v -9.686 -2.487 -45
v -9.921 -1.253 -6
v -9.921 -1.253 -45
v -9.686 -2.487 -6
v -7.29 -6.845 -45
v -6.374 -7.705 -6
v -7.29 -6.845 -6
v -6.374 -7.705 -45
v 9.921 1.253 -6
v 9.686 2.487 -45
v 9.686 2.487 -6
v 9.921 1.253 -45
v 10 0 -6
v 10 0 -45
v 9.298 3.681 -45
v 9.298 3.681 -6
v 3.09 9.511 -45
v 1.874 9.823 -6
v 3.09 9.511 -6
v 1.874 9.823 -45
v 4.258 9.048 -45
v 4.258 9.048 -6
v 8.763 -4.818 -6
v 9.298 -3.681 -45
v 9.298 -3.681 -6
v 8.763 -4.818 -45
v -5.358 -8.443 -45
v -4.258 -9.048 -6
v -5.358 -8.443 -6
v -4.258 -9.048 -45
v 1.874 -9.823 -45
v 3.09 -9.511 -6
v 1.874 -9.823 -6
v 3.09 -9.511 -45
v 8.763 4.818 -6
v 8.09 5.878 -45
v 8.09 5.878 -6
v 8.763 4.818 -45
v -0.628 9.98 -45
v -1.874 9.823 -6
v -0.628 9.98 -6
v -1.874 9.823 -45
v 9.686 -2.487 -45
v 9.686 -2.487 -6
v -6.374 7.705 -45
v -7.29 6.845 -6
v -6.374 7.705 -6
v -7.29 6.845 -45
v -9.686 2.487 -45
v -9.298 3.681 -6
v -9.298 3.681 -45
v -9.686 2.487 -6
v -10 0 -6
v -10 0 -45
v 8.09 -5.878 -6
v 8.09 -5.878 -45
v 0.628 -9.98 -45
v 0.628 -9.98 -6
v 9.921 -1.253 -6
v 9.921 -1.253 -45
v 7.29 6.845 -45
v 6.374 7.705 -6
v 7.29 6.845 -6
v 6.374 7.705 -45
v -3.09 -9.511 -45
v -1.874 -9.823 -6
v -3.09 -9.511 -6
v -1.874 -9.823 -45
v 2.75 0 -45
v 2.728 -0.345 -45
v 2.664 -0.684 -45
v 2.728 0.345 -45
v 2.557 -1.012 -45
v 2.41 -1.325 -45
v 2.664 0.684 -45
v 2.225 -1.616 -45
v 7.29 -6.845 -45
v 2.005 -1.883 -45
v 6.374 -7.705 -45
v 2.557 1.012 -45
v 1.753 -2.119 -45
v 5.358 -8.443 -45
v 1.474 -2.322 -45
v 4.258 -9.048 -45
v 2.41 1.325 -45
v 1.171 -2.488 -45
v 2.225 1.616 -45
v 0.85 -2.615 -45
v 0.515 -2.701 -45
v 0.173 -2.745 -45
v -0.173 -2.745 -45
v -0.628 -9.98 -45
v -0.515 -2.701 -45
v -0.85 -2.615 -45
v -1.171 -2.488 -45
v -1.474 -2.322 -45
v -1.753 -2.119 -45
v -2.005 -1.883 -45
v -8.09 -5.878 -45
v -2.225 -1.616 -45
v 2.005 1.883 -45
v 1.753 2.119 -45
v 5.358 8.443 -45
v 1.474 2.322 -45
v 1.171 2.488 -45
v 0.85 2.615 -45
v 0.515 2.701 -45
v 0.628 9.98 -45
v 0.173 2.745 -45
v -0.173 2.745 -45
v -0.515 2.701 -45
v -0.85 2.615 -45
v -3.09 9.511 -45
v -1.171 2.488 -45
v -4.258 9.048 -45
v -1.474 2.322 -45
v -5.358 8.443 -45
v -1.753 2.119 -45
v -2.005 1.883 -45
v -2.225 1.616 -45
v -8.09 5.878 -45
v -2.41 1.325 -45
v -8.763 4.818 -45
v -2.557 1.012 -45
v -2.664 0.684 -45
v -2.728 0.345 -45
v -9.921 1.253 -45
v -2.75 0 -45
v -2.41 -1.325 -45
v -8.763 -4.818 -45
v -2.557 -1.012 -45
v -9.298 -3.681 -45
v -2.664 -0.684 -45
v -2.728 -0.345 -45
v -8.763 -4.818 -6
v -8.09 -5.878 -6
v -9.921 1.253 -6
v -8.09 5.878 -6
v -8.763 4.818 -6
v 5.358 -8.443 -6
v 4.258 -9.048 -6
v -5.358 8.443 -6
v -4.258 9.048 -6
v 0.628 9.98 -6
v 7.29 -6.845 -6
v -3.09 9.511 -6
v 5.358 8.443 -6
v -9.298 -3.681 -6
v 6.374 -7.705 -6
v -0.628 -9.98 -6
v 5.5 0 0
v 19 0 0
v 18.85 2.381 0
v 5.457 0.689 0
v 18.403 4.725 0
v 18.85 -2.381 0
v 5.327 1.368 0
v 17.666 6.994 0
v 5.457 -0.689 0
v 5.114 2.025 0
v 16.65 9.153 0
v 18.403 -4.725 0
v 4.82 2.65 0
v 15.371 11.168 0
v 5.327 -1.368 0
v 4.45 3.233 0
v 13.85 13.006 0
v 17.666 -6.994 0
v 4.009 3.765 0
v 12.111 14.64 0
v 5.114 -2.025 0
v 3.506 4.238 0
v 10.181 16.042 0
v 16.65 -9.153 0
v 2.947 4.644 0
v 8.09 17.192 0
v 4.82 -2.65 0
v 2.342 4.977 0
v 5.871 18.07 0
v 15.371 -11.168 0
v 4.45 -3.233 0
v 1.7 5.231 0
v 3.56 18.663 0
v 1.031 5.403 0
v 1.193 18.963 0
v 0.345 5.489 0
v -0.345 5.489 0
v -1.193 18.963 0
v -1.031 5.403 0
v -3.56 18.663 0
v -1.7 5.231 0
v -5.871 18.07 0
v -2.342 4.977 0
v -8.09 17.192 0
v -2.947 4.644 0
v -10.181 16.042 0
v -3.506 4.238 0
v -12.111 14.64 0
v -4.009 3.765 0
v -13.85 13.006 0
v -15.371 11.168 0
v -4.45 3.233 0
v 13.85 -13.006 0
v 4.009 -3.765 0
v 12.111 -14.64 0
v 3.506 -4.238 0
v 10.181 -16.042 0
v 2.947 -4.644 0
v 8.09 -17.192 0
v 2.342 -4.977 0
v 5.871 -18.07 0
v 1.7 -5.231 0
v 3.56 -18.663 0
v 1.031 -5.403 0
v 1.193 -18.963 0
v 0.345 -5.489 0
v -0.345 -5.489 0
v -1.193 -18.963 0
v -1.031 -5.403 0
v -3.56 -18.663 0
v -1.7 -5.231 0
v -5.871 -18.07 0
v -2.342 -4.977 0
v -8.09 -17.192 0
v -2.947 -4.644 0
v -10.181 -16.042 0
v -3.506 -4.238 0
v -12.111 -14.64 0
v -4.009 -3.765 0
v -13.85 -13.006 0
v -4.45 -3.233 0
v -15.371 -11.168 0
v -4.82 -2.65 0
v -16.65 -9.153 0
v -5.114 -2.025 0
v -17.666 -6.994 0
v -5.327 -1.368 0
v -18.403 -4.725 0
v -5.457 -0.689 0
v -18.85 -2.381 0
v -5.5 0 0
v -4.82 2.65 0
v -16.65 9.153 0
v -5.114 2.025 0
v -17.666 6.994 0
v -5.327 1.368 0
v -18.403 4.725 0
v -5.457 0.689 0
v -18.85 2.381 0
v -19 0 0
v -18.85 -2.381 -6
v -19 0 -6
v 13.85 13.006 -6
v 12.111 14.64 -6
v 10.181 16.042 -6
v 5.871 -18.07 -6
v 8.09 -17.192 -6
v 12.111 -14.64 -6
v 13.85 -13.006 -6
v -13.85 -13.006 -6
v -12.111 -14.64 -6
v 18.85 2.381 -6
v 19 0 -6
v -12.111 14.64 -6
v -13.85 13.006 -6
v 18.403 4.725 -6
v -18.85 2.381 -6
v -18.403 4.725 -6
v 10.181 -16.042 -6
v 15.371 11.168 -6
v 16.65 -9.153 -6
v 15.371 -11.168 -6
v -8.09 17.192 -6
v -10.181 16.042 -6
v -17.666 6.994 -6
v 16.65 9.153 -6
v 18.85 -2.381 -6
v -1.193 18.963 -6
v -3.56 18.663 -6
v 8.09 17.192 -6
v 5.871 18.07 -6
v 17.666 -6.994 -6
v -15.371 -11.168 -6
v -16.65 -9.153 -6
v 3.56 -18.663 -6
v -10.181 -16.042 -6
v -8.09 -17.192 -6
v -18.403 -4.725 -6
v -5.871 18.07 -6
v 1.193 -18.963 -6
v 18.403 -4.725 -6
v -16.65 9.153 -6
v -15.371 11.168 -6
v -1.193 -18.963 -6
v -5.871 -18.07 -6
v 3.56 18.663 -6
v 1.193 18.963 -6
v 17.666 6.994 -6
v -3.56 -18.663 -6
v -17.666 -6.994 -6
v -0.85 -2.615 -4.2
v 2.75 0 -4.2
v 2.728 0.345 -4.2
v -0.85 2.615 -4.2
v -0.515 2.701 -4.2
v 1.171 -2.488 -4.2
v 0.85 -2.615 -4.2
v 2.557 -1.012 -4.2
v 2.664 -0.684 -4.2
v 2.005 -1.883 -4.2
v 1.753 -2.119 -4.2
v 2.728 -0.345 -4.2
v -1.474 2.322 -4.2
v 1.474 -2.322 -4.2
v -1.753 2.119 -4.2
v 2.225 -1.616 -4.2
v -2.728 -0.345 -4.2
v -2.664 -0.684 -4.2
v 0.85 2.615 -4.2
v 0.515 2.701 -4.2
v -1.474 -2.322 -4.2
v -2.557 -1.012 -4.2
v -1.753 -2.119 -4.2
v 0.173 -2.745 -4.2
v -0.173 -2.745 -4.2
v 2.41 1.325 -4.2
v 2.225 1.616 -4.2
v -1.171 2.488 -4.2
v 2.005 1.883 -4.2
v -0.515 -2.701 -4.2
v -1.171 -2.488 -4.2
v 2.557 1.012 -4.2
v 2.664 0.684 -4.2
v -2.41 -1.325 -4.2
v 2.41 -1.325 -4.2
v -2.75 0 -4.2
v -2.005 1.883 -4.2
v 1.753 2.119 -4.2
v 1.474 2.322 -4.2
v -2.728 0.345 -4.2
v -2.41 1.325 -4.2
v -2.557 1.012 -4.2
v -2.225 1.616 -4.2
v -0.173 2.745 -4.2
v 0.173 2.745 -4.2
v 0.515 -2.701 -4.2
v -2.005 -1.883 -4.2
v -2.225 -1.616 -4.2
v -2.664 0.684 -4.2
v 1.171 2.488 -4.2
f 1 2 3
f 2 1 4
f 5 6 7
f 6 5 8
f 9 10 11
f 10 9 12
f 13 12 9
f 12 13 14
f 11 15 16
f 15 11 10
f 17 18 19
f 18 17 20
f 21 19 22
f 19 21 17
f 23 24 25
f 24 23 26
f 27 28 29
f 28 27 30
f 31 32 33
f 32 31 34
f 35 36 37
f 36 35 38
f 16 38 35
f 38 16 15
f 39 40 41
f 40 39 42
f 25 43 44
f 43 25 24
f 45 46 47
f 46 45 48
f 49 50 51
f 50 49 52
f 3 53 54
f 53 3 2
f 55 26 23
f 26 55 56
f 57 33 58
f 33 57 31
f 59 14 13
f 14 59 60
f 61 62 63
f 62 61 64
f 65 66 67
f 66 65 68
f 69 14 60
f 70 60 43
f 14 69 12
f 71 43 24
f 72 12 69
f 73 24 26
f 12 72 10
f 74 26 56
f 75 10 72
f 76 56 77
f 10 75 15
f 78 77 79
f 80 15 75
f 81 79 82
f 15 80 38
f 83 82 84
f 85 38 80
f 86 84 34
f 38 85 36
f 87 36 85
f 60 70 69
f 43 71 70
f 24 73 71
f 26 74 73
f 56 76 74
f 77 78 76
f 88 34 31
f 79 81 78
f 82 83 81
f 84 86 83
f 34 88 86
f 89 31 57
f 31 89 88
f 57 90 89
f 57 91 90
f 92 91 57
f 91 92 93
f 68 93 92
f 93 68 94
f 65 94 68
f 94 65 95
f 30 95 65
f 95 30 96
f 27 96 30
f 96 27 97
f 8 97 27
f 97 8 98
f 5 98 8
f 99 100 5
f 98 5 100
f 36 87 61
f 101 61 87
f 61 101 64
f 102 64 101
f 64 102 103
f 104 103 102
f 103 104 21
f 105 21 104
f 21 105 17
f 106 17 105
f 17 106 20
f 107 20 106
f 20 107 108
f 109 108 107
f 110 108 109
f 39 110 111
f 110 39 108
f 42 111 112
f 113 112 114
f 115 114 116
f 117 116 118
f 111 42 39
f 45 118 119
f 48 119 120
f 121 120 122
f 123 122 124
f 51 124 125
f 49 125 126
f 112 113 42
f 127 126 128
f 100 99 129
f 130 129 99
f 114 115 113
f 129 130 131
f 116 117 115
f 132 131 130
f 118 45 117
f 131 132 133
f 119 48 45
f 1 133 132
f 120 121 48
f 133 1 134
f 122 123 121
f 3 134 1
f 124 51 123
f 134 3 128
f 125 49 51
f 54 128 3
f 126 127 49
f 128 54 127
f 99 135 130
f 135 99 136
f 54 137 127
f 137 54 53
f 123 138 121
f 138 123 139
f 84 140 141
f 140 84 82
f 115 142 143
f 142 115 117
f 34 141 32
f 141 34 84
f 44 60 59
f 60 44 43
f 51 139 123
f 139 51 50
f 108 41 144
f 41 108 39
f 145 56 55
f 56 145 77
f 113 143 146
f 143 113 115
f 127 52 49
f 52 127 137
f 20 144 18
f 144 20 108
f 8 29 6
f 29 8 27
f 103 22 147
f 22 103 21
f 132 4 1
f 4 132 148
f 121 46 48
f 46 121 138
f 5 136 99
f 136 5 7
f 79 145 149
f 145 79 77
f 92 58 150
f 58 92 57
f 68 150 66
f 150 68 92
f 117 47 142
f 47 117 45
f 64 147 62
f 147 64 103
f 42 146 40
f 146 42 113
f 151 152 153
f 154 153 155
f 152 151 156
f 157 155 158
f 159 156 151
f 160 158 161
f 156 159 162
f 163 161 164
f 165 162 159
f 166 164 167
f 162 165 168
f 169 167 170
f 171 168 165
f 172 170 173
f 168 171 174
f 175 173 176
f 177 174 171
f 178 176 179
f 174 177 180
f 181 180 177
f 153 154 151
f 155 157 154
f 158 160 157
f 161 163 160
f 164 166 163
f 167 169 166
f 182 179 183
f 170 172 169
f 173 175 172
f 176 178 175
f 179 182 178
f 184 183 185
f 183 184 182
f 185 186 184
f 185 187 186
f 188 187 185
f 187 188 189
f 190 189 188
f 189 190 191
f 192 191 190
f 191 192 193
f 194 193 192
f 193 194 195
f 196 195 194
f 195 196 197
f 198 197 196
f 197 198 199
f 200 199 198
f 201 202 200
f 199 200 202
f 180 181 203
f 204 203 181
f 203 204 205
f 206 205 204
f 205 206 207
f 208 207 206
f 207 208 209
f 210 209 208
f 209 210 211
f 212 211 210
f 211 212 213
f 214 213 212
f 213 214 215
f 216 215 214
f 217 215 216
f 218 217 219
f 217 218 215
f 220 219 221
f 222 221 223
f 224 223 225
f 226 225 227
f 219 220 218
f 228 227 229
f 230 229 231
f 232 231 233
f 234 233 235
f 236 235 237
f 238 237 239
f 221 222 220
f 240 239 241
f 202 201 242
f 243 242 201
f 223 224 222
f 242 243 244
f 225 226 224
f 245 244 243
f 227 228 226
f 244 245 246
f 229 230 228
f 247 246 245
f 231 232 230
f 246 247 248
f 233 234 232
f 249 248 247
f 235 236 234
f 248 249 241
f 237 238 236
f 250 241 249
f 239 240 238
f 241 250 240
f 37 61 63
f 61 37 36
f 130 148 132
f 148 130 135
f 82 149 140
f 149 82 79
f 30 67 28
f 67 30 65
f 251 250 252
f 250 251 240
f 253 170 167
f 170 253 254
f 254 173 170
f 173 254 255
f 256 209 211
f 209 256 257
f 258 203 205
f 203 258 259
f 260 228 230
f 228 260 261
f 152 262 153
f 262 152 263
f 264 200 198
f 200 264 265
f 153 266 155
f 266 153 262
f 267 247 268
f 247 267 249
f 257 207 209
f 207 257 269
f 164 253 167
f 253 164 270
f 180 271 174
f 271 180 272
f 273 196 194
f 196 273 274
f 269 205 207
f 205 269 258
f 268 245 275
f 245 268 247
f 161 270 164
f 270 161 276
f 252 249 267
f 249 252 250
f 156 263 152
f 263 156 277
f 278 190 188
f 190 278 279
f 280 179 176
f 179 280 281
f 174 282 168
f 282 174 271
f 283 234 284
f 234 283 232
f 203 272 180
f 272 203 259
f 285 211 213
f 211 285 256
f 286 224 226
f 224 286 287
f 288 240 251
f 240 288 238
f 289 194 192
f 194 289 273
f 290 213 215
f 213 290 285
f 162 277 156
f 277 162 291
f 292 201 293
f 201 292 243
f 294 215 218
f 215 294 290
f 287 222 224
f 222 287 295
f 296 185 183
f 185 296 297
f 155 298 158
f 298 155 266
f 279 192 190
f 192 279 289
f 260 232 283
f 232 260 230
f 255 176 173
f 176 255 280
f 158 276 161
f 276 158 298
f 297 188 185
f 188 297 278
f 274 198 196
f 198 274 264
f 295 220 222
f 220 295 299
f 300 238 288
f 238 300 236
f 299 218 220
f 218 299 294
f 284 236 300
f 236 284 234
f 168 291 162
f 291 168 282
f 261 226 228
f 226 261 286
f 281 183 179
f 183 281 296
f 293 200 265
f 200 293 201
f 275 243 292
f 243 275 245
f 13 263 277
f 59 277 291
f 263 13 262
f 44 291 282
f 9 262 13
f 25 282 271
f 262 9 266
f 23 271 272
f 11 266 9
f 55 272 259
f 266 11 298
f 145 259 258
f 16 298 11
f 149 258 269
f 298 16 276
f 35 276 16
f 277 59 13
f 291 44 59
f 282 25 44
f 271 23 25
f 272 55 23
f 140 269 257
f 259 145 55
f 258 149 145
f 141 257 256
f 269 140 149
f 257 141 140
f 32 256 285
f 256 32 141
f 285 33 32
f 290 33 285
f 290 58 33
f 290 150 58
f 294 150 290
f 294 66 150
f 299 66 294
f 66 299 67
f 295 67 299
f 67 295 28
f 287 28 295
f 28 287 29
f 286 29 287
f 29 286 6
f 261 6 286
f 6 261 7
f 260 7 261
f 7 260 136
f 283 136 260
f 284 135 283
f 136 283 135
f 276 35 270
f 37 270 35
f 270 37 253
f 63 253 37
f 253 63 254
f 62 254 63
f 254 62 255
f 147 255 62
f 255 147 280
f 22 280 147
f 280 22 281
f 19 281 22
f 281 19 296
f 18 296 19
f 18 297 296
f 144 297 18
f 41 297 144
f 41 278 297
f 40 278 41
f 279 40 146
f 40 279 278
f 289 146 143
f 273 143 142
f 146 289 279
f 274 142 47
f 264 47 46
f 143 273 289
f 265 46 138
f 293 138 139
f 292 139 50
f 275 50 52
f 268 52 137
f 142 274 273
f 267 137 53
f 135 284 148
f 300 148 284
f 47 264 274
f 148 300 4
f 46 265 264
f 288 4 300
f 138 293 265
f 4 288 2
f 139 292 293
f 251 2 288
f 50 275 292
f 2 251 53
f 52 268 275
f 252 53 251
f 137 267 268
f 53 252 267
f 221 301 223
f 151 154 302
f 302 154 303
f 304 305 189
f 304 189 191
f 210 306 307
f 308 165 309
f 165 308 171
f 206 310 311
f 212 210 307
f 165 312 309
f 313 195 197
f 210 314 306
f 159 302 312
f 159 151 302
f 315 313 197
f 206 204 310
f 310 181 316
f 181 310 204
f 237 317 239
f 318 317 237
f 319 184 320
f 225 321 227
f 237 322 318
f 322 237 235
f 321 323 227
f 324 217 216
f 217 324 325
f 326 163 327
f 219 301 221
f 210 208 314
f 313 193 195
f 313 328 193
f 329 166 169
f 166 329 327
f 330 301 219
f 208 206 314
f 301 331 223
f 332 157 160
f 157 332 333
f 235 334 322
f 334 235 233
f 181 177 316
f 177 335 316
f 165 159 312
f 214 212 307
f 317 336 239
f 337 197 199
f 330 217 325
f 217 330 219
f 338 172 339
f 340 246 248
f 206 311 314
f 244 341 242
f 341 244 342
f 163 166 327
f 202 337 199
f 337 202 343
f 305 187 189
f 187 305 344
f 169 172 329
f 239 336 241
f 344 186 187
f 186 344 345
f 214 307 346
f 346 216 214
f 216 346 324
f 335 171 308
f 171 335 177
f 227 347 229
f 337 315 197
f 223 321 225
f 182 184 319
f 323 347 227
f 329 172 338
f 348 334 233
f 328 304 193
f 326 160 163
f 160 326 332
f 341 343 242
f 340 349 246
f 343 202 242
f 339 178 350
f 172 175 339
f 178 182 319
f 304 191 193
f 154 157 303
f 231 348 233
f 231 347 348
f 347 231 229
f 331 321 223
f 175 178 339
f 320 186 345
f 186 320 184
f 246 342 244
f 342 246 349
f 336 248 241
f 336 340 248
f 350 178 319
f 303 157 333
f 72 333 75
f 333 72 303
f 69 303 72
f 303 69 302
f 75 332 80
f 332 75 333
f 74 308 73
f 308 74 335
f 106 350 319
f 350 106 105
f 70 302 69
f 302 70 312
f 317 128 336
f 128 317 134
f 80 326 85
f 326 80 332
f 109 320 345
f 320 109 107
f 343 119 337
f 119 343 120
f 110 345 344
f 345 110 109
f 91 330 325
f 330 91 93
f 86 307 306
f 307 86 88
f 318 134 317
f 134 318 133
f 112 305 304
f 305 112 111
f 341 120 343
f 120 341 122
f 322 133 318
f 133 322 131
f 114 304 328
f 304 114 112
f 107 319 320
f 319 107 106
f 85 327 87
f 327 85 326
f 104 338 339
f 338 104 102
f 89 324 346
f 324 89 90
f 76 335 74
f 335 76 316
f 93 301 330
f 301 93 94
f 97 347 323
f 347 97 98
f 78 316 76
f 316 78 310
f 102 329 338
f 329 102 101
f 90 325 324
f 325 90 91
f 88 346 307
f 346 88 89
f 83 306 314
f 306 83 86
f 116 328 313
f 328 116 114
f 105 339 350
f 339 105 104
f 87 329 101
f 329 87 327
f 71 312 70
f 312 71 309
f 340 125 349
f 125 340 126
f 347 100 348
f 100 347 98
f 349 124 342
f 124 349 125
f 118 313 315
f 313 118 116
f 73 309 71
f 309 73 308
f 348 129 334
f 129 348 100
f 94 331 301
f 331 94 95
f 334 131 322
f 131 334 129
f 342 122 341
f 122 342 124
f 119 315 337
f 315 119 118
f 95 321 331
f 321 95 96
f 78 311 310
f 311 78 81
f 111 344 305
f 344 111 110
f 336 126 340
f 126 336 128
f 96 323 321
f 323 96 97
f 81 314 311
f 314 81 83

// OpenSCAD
$fn = 50;


difference() {
	union() {
		translate(v = [0, 0, -45.0000000000]) {
			cylinder(h = 45, r = 10.0000000000);
		}
		translate(v = [0, 0, -6.0000000000]) {
			cylinder(h = 6, r = 19.0000000000);
		}
	}
	union() {
		translate(v = [0, 0, 0]) {
			rotate(a = [0, 0, 0]) {
				difference() {
					union() {
						#translate(v = [0, 0, -45.0000000000]) {
							cylinder(h = 45, r = 2.2500000000);
						}
						#translate(v = [0, 0, -4.2000000000]) {
							cylinder(h = 4.2000000000, r1 = 2.7500000000, r2 = 5.5000000000);
						}
						#translate(v = [0, 0, -45.0000000000]) {
							cylinder(h = 45, r = 2.7500000000);
						}
						#translate(v = [0, 0, -45.0000000000]) {
							cylinder(h = 45, r = 2.2500000000);
						}
					}
					union();
				}
			}
		}
	}
}
